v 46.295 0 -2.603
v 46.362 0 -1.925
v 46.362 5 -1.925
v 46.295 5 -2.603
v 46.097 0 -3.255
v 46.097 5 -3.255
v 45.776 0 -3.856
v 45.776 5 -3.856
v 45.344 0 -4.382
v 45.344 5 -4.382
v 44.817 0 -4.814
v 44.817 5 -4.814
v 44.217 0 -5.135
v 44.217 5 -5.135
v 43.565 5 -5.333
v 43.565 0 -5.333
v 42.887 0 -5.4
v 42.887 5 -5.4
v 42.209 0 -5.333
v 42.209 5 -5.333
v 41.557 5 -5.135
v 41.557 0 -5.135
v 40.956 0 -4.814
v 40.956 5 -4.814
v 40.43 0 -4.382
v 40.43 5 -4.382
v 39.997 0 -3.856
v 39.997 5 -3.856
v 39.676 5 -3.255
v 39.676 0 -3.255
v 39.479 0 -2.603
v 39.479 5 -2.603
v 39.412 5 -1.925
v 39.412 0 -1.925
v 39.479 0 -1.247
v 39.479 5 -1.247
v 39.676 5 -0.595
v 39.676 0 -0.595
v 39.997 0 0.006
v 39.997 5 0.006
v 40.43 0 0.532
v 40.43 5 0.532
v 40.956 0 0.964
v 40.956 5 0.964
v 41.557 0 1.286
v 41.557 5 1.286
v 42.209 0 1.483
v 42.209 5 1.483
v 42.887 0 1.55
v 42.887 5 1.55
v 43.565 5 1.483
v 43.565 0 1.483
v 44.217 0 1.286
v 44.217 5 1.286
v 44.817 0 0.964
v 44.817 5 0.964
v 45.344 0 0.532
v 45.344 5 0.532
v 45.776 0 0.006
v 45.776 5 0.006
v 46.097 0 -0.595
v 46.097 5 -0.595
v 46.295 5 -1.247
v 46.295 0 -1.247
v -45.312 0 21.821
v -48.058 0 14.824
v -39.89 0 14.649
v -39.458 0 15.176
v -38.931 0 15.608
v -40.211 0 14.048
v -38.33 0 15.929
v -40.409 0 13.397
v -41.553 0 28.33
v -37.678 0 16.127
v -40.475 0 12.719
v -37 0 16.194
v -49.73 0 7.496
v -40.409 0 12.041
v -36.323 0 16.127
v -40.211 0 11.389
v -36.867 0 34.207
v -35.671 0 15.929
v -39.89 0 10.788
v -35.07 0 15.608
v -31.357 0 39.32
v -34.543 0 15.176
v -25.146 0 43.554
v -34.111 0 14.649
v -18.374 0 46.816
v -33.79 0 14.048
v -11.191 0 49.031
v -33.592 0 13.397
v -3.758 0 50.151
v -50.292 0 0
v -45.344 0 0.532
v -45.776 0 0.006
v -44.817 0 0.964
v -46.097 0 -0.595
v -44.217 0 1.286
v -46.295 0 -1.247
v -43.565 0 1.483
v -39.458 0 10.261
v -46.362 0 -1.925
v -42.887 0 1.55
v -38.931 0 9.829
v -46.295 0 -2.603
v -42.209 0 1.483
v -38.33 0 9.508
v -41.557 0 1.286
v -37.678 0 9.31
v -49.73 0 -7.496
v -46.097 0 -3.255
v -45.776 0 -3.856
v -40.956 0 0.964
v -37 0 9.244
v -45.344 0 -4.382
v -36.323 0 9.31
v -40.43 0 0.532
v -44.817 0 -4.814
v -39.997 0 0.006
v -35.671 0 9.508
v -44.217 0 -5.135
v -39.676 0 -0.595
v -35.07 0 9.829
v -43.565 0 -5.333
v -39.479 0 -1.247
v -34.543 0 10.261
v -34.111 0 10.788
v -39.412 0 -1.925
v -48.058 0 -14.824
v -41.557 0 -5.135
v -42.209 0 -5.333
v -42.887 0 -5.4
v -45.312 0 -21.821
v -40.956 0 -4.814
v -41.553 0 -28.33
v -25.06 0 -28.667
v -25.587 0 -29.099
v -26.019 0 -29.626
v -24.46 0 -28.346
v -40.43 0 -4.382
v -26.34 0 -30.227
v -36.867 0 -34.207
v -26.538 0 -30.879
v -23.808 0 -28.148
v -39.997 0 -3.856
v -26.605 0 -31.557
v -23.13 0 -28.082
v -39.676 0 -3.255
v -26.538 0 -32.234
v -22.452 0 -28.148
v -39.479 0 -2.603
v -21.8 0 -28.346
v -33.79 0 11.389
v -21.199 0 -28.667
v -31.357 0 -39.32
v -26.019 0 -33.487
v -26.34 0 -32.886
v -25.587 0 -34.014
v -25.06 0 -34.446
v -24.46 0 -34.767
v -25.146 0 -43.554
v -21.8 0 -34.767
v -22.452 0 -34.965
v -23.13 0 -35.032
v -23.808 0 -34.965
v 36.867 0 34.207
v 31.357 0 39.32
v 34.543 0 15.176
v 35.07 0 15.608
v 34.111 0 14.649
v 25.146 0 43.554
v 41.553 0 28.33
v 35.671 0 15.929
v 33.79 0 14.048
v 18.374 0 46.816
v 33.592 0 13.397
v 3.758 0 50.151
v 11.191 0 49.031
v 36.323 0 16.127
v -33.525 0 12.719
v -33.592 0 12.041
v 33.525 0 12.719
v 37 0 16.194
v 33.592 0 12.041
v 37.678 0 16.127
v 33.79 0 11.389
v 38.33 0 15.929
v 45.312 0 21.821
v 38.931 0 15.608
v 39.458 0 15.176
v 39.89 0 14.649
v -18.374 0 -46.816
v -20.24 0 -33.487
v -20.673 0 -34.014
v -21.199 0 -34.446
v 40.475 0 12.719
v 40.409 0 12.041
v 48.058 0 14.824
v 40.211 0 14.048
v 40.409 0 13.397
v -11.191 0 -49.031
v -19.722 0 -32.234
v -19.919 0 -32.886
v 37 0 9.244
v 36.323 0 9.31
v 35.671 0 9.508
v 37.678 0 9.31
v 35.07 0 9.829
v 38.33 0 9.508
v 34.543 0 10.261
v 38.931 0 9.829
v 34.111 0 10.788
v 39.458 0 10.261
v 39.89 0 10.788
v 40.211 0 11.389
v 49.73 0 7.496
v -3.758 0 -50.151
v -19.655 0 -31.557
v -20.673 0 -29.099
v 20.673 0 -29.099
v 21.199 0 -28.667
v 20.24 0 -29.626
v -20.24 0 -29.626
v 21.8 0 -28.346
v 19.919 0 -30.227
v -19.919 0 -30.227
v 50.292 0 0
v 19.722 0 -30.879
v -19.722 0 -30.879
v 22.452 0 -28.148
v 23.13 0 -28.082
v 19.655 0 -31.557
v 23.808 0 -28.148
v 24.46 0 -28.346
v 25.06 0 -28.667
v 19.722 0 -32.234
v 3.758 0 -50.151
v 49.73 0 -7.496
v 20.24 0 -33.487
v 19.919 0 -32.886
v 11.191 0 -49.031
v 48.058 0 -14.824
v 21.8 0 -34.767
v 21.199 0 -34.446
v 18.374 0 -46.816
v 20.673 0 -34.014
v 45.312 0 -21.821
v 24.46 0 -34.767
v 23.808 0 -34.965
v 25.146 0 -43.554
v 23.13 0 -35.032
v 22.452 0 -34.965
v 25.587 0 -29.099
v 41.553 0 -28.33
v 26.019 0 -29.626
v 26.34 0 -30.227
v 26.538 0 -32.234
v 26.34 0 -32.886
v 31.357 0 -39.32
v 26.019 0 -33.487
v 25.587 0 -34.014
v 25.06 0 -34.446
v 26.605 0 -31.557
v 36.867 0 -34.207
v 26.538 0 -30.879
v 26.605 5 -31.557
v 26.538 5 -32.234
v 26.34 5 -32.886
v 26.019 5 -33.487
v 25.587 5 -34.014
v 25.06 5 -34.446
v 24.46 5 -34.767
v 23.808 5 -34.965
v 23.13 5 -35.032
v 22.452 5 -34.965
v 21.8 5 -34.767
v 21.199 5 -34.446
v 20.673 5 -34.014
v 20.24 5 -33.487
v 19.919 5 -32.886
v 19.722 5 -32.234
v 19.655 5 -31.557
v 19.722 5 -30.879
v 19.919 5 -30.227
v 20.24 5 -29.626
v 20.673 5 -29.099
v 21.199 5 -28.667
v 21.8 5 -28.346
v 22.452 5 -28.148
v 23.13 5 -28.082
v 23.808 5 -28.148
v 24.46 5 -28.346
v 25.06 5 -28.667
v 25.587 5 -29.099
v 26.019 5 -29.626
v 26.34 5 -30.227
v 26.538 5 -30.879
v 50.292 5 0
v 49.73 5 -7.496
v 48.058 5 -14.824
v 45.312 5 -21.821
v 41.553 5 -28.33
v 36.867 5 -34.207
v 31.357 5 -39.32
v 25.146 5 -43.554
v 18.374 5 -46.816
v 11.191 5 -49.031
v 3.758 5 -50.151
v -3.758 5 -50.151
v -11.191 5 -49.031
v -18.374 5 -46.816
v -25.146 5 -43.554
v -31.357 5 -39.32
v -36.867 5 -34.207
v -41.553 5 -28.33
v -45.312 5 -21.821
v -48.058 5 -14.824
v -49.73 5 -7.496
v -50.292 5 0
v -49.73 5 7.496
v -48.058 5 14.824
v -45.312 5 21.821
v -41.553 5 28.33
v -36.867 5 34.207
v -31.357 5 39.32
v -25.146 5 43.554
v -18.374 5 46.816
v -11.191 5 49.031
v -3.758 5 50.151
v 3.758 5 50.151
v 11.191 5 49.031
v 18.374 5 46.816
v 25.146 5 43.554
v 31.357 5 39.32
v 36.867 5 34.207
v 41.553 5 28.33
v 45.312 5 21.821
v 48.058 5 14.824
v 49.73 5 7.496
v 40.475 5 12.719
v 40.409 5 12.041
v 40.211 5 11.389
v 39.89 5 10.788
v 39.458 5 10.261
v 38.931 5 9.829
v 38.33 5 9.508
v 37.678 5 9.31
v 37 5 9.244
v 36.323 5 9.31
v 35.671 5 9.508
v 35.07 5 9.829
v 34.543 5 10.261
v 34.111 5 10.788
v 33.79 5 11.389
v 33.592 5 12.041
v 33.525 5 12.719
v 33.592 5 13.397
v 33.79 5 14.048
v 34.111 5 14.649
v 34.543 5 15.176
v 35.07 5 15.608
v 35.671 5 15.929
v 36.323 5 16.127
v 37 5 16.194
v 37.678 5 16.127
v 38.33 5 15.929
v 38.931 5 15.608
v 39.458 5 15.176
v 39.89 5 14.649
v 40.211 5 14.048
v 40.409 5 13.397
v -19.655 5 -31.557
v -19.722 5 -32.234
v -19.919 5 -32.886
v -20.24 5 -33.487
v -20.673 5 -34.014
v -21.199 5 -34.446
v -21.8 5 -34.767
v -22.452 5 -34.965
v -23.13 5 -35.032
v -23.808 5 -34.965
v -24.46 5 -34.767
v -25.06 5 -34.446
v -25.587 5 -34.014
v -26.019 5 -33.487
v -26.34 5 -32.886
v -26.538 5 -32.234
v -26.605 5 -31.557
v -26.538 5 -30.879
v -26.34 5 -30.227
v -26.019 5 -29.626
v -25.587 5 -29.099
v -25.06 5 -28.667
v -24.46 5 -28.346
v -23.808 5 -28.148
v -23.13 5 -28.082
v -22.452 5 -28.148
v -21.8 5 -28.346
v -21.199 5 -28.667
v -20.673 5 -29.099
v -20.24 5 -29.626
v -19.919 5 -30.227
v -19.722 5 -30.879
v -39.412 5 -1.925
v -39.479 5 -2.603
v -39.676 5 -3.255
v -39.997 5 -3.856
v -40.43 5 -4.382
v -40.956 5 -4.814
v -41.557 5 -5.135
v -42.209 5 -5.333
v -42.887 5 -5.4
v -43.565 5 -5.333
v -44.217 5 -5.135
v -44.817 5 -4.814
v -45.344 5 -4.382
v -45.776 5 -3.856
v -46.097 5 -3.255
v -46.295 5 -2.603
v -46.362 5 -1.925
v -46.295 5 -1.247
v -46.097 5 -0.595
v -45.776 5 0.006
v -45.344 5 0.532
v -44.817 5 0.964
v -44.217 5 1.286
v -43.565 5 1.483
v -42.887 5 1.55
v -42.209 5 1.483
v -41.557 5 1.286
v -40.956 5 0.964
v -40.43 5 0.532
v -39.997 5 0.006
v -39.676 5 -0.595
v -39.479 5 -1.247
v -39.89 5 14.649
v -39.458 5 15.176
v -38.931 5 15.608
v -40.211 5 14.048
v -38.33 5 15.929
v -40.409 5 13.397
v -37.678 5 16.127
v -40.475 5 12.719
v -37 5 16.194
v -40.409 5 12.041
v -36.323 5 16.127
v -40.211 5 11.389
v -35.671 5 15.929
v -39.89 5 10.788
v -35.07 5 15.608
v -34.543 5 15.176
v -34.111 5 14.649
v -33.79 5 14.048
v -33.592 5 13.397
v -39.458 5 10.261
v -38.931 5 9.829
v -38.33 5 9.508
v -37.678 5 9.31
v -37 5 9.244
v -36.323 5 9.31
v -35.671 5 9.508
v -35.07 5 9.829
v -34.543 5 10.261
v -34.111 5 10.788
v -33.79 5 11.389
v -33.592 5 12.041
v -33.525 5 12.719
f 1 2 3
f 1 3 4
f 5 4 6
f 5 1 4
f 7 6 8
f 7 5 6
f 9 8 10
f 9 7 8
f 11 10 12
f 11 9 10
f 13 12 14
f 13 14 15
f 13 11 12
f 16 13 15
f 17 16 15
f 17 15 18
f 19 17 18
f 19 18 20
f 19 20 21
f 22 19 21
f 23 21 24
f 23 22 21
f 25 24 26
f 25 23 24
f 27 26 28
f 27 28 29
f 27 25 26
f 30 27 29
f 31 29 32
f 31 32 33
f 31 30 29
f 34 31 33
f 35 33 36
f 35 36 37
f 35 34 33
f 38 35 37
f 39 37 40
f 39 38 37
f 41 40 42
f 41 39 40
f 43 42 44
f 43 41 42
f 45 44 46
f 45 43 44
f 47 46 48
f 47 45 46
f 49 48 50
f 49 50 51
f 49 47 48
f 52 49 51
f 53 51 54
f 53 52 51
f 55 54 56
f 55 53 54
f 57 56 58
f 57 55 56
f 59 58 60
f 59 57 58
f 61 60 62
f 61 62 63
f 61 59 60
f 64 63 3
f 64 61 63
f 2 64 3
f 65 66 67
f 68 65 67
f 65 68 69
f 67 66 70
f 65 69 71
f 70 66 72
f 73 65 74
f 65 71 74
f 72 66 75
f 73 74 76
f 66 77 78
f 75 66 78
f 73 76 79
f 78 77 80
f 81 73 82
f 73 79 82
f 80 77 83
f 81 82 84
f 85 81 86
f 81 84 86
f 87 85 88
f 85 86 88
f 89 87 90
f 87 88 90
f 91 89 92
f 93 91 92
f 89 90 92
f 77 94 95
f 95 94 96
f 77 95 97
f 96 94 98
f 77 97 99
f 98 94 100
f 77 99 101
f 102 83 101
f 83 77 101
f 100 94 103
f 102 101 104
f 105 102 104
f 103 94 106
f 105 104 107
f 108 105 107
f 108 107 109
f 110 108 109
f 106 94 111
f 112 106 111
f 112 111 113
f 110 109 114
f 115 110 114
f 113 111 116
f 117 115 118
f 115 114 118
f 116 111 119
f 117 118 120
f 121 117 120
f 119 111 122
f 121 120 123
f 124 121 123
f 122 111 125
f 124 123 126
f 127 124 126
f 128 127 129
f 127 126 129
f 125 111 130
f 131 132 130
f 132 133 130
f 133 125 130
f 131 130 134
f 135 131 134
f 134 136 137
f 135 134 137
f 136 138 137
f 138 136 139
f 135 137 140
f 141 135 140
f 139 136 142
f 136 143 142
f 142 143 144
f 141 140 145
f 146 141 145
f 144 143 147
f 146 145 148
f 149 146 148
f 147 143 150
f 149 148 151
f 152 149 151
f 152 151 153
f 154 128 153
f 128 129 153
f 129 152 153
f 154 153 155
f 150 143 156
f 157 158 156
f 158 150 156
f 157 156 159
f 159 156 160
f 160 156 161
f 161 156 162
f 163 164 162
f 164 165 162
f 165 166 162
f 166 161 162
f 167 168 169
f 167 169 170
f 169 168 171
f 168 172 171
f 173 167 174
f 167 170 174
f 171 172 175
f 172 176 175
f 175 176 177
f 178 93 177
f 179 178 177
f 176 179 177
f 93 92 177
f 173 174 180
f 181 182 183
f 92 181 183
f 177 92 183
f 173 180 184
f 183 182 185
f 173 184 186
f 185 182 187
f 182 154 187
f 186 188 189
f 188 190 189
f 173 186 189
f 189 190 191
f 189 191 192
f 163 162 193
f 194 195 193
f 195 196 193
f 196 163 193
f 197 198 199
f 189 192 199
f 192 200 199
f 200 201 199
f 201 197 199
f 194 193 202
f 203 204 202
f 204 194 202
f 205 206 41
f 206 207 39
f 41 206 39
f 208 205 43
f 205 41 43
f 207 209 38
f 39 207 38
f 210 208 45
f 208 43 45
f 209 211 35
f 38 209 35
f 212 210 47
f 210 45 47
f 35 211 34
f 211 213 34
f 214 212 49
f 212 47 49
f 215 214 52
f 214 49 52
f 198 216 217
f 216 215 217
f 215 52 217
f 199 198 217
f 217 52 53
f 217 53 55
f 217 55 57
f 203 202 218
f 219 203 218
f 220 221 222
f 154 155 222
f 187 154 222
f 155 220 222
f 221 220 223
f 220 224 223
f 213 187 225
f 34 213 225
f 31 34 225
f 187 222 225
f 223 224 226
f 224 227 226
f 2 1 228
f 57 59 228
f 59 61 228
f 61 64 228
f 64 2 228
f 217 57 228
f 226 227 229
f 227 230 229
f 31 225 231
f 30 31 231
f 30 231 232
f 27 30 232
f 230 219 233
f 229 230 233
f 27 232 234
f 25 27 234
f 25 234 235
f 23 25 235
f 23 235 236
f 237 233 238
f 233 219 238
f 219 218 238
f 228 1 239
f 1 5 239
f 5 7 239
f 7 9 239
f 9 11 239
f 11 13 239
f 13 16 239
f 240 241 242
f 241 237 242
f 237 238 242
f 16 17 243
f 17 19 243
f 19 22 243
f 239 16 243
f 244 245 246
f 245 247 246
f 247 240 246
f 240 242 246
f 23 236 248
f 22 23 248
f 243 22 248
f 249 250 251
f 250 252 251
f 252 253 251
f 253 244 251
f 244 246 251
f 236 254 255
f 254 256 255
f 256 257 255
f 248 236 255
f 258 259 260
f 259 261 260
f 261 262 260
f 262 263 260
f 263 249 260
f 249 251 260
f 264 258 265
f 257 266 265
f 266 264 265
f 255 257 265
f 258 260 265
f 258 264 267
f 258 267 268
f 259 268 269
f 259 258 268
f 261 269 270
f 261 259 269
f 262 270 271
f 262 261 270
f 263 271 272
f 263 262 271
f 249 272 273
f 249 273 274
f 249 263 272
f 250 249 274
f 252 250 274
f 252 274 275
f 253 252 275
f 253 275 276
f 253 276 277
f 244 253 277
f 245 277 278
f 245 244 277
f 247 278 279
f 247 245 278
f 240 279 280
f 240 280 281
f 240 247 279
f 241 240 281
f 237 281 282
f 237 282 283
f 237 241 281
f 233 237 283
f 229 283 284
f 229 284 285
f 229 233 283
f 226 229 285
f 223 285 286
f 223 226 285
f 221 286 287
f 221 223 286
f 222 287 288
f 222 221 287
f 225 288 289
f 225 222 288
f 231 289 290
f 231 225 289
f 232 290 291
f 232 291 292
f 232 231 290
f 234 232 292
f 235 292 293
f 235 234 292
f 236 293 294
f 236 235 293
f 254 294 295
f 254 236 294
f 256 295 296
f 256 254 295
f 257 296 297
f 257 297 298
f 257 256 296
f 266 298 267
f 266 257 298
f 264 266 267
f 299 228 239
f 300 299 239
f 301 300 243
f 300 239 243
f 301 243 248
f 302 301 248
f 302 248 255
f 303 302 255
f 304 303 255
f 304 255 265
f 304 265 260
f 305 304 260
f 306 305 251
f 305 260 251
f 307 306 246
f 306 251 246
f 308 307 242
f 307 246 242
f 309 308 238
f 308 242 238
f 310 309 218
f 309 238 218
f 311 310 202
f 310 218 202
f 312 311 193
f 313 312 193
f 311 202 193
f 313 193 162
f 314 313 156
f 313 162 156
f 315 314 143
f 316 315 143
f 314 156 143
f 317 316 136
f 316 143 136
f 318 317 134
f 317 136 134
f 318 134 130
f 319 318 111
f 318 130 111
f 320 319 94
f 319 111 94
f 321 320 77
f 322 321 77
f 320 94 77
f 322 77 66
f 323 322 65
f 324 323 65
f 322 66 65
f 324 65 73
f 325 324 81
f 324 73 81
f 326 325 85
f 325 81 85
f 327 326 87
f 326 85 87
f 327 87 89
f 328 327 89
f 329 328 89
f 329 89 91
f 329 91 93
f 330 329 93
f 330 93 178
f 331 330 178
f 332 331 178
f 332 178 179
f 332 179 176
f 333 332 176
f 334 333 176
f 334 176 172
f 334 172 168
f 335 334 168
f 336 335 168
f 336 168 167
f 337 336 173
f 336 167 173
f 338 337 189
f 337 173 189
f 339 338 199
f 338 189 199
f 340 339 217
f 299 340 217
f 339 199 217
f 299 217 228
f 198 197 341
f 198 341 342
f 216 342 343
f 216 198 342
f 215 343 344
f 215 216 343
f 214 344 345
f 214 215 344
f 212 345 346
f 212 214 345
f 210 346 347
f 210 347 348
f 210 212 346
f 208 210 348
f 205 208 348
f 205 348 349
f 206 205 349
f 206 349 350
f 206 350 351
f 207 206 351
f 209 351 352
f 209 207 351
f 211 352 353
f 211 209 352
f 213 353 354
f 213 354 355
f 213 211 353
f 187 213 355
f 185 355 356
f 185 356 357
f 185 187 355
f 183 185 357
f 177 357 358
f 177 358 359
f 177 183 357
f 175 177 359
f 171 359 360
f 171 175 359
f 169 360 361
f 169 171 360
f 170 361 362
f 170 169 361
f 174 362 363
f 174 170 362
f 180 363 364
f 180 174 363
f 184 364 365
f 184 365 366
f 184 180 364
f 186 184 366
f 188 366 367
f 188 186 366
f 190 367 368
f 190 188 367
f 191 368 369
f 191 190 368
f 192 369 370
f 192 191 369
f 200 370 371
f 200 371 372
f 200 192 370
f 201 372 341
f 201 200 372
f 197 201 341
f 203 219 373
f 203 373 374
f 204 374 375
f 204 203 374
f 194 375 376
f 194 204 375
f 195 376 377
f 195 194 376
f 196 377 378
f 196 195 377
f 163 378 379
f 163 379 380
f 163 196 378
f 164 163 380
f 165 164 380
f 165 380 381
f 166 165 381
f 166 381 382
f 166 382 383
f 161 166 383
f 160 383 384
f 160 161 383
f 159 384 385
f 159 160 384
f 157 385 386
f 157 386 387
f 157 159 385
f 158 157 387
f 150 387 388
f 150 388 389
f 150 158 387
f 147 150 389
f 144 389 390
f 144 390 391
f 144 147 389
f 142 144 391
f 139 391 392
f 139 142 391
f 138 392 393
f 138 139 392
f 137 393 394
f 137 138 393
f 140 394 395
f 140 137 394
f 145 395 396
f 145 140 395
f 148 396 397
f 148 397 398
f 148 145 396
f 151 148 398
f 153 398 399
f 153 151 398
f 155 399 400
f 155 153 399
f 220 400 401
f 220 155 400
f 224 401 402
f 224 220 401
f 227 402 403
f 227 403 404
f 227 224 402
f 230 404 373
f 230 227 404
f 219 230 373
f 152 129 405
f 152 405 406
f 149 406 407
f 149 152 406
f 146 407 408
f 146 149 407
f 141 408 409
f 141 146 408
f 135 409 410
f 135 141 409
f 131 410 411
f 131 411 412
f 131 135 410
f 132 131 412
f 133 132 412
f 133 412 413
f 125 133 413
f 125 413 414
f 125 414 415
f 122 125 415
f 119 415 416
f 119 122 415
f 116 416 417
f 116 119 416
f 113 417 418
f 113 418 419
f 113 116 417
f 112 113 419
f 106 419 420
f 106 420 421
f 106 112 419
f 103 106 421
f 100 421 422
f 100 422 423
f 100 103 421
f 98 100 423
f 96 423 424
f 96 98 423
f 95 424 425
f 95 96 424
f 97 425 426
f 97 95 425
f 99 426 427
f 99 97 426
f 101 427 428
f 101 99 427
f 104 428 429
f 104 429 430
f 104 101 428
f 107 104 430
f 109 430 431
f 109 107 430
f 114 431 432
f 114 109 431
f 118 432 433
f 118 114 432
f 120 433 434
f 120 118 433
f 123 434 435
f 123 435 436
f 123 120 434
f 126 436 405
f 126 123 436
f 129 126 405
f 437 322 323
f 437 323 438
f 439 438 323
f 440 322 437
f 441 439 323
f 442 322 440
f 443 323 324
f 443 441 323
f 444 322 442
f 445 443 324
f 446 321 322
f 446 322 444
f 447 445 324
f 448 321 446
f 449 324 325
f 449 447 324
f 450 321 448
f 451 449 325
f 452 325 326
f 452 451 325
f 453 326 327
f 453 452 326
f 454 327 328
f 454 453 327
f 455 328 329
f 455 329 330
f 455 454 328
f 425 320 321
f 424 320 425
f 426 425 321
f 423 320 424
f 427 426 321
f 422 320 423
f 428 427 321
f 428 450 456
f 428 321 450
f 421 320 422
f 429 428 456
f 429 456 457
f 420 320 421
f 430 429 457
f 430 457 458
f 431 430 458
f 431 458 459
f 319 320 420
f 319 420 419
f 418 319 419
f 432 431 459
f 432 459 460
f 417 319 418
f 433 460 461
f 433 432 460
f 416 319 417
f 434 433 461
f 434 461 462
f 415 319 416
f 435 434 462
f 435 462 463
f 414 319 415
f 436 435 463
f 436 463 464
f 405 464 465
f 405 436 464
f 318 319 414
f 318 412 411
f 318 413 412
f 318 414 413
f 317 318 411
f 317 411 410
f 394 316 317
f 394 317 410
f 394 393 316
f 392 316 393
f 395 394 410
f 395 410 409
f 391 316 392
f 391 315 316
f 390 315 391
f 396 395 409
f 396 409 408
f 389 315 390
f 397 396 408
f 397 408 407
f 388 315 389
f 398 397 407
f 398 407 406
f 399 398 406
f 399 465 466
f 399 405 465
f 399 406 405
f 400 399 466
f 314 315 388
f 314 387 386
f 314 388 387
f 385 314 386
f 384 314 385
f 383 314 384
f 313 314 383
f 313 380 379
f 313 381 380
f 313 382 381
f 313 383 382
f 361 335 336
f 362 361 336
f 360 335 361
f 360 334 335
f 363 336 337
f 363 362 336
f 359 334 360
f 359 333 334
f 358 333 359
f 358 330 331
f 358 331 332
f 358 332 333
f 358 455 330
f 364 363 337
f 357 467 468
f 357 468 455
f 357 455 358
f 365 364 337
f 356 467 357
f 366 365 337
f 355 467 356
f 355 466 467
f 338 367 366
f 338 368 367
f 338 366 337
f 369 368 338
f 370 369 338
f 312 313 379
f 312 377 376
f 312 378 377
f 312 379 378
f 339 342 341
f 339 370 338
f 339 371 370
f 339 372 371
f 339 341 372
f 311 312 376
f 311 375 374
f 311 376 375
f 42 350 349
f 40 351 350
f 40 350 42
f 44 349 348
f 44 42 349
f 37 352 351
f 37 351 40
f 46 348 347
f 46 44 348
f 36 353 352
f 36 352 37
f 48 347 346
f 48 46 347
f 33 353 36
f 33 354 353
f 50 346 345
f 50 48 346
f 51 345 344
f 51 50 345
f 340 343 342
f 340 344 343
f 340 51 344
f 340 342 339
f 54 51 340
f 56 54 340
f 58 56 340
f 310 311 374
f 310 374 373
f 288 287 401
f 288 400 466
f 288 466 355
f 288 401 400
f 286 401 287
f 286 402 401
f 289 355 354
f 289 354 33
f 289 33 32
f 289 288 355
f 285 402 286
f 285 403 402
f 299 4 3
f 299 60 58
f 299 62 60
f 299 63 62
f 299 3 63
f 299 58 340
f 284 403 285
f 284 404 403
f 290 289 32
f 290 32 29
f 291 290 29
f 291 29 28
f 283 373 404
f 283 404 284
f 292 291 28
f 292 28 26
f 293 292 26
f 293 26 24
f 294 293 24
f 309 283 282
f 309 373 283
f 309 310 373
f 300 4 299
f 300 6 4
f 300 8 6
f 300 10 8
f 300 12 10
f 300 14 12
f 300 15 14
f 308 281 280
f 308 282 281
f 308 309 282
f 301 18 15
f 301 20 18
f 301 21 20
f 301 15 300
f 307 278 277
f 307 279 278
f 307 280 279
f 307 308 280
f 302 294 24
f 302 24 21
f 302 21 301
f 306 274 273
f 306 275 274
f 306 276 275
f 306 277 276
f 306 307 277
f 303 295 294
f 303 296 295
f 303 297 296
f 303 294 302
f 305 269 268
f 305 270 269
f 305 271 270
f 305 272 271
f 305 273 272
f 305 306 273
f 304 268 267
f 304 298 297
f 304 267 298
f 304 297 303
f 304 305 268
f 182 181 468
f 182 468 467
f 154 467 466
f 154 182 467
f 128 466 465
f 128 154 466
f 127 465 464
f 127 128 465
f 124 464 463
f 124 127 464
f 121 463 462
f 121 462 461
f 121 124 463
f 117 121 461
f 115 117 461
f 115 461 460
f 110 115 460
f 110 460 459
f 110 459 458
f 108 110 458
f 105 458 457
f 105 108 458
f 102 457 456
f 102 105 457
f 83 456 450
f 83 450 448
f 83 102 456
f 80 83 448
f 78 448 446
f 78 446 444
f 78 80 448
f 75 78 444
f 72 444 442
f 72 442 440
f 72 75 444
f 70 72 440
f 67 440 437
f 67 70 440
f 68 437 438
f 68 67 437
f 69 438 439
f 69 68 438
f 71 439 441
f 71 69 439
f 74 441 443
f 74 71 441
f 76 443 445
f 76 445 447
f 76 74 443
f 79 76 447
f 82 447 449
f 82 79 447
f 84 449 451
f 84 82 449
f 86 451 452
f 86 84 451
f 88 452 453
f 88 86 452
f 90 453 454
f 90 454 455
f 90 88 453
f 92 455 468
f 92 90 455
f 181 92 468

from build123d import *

# Parameters (mm, degrees)
SKETCH1_R           = 50.292
SKETCH1_R_2         = 3.475
BOSS_EXTRUDE1_DEPTH = 5


with BuildPart() as part:
    # Sketch1 → Boss-Extrude1 (new body)
    with BuildSketch(Plane(origin=(0, 0, 0), x_dir=(1, 0, 0), z_dir=(0, 1, 0))):
        Circle(SKETCH1_R)
        with Locations((42.886820356, 1.924977859)):
            Circle(SKETCH1_R_2, mode=Mode.SUBTRACT)
        with Locations((-42.886820356, 1.924977859)):
            Circle(SKETCH1_R_2, mode=Mode.SUBTRACT)
        with Locations((-37.000474826, -12.718618748)):
            Circle(SKETCH1_R_2, mode=Mode.SUBTRACT)
        with Locations((-23.129730363, 31.556520301)):
            Circle(SKETCH1_R_2, mode=Mode.SUBTRACT)
        with Locations((37.000474826, -12.718618748)):
            Circle(SKETCH1_R_2, mode=Mode.SUBTRACT)
        with Locations((23.129730363, 31.556520301)):
            Circle(SKETCH1_R_2, mode=Mode.SUBTRACT)
    extrude(amount=BOSS_EXTRUDE1_DEPTH)


solid = part.part
